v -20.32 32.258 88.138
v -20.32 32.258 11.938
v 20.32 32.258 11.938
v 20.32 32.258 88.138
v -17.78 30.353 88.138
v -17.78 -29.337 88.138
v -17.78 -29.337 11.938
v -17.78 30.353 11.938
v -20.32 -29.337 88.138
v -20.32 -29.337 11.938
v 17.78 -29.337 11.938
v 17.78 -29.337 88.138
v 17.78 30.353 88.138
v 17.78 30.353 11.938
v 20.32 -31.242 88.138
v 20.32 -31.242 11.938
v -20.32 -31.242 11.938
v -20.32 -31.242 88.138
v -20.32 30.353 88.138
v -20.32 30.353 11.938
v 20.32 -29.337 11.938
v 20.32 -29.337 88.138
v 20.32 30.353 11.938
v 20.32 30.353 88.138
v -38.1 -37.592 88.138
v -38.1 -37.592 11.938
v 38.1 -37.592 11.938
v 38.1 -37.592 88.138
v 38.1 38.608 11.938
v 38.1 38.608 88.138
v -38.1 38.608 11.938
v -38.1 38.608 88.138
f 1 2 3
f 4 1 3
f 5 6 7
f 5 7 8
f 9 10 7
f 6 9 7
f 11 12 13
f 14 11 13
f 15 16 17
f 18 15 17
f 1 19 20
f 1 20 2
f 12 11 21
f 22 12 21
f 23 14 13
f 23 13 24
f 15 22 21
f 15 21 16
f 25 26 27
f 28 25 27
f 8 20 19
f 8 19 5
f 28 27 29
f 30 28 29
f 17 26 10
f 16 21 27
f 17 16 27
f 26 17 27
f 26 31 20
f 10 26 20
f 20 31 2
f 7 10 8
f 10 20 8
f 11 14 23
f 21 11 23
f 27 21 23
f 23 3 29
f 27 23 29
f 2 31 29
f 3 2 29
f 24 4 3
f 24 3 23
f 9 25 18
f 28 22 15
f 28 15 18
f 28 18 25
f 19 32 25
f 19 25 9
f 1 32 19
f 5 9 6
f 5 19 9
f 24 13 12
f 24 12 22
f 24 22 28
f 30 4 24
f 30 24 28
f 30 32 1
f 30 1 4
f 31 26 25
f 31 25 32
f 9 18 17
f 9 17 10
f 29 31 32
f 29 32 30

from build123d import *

# Parameters (mm, degrees)
F0_W     = 76.2
F0_H     = 76.2
F0_W_2   = 2.54
F0_H_2   = 59.69
F1_DEPTH = 76.2


# Not quite as in the source:
# - the program builds the solid bodies; features that only make, move or delete a surface that nothing else refers to are left out


with BuildPart() as f1:
    # F0 (on Top) → F1 (new body)
    with BuildSketch(Plane.XY):
        with Locations((-38.1, 38.1)):
            Rectangle(F0_W, F0_H)
        Polygon((-58.42, 69.85), (-17.78, 69.85), (-17.78, 67.945), (-17.78, 8.255), (-17.78, 6.35), (-58.42, 6.35), (-58.42, 8.255), (-58.42, 67.945), align=None, mode=Mode.SUBTRACT)
        with Locations((-57.15, 38.1)):
            Rectangle(F0_W_2, F0_H_2)
        with Locations((-19.05, 38.1)):
            Rectangle(F0_W_2, F0_H_2)
    extrude(amount=F1_DEPTH)


with BuildPart() as f1_1:
    # F3: moved
    add(f1.part.moved(Location((0, 106.934, 0))))


with BuildPart() as f1_2:
    # F6: moved
    add(f1_1.part.moved(Location((38.1, -144.526, 11.938))))


solid = f1_2.part
